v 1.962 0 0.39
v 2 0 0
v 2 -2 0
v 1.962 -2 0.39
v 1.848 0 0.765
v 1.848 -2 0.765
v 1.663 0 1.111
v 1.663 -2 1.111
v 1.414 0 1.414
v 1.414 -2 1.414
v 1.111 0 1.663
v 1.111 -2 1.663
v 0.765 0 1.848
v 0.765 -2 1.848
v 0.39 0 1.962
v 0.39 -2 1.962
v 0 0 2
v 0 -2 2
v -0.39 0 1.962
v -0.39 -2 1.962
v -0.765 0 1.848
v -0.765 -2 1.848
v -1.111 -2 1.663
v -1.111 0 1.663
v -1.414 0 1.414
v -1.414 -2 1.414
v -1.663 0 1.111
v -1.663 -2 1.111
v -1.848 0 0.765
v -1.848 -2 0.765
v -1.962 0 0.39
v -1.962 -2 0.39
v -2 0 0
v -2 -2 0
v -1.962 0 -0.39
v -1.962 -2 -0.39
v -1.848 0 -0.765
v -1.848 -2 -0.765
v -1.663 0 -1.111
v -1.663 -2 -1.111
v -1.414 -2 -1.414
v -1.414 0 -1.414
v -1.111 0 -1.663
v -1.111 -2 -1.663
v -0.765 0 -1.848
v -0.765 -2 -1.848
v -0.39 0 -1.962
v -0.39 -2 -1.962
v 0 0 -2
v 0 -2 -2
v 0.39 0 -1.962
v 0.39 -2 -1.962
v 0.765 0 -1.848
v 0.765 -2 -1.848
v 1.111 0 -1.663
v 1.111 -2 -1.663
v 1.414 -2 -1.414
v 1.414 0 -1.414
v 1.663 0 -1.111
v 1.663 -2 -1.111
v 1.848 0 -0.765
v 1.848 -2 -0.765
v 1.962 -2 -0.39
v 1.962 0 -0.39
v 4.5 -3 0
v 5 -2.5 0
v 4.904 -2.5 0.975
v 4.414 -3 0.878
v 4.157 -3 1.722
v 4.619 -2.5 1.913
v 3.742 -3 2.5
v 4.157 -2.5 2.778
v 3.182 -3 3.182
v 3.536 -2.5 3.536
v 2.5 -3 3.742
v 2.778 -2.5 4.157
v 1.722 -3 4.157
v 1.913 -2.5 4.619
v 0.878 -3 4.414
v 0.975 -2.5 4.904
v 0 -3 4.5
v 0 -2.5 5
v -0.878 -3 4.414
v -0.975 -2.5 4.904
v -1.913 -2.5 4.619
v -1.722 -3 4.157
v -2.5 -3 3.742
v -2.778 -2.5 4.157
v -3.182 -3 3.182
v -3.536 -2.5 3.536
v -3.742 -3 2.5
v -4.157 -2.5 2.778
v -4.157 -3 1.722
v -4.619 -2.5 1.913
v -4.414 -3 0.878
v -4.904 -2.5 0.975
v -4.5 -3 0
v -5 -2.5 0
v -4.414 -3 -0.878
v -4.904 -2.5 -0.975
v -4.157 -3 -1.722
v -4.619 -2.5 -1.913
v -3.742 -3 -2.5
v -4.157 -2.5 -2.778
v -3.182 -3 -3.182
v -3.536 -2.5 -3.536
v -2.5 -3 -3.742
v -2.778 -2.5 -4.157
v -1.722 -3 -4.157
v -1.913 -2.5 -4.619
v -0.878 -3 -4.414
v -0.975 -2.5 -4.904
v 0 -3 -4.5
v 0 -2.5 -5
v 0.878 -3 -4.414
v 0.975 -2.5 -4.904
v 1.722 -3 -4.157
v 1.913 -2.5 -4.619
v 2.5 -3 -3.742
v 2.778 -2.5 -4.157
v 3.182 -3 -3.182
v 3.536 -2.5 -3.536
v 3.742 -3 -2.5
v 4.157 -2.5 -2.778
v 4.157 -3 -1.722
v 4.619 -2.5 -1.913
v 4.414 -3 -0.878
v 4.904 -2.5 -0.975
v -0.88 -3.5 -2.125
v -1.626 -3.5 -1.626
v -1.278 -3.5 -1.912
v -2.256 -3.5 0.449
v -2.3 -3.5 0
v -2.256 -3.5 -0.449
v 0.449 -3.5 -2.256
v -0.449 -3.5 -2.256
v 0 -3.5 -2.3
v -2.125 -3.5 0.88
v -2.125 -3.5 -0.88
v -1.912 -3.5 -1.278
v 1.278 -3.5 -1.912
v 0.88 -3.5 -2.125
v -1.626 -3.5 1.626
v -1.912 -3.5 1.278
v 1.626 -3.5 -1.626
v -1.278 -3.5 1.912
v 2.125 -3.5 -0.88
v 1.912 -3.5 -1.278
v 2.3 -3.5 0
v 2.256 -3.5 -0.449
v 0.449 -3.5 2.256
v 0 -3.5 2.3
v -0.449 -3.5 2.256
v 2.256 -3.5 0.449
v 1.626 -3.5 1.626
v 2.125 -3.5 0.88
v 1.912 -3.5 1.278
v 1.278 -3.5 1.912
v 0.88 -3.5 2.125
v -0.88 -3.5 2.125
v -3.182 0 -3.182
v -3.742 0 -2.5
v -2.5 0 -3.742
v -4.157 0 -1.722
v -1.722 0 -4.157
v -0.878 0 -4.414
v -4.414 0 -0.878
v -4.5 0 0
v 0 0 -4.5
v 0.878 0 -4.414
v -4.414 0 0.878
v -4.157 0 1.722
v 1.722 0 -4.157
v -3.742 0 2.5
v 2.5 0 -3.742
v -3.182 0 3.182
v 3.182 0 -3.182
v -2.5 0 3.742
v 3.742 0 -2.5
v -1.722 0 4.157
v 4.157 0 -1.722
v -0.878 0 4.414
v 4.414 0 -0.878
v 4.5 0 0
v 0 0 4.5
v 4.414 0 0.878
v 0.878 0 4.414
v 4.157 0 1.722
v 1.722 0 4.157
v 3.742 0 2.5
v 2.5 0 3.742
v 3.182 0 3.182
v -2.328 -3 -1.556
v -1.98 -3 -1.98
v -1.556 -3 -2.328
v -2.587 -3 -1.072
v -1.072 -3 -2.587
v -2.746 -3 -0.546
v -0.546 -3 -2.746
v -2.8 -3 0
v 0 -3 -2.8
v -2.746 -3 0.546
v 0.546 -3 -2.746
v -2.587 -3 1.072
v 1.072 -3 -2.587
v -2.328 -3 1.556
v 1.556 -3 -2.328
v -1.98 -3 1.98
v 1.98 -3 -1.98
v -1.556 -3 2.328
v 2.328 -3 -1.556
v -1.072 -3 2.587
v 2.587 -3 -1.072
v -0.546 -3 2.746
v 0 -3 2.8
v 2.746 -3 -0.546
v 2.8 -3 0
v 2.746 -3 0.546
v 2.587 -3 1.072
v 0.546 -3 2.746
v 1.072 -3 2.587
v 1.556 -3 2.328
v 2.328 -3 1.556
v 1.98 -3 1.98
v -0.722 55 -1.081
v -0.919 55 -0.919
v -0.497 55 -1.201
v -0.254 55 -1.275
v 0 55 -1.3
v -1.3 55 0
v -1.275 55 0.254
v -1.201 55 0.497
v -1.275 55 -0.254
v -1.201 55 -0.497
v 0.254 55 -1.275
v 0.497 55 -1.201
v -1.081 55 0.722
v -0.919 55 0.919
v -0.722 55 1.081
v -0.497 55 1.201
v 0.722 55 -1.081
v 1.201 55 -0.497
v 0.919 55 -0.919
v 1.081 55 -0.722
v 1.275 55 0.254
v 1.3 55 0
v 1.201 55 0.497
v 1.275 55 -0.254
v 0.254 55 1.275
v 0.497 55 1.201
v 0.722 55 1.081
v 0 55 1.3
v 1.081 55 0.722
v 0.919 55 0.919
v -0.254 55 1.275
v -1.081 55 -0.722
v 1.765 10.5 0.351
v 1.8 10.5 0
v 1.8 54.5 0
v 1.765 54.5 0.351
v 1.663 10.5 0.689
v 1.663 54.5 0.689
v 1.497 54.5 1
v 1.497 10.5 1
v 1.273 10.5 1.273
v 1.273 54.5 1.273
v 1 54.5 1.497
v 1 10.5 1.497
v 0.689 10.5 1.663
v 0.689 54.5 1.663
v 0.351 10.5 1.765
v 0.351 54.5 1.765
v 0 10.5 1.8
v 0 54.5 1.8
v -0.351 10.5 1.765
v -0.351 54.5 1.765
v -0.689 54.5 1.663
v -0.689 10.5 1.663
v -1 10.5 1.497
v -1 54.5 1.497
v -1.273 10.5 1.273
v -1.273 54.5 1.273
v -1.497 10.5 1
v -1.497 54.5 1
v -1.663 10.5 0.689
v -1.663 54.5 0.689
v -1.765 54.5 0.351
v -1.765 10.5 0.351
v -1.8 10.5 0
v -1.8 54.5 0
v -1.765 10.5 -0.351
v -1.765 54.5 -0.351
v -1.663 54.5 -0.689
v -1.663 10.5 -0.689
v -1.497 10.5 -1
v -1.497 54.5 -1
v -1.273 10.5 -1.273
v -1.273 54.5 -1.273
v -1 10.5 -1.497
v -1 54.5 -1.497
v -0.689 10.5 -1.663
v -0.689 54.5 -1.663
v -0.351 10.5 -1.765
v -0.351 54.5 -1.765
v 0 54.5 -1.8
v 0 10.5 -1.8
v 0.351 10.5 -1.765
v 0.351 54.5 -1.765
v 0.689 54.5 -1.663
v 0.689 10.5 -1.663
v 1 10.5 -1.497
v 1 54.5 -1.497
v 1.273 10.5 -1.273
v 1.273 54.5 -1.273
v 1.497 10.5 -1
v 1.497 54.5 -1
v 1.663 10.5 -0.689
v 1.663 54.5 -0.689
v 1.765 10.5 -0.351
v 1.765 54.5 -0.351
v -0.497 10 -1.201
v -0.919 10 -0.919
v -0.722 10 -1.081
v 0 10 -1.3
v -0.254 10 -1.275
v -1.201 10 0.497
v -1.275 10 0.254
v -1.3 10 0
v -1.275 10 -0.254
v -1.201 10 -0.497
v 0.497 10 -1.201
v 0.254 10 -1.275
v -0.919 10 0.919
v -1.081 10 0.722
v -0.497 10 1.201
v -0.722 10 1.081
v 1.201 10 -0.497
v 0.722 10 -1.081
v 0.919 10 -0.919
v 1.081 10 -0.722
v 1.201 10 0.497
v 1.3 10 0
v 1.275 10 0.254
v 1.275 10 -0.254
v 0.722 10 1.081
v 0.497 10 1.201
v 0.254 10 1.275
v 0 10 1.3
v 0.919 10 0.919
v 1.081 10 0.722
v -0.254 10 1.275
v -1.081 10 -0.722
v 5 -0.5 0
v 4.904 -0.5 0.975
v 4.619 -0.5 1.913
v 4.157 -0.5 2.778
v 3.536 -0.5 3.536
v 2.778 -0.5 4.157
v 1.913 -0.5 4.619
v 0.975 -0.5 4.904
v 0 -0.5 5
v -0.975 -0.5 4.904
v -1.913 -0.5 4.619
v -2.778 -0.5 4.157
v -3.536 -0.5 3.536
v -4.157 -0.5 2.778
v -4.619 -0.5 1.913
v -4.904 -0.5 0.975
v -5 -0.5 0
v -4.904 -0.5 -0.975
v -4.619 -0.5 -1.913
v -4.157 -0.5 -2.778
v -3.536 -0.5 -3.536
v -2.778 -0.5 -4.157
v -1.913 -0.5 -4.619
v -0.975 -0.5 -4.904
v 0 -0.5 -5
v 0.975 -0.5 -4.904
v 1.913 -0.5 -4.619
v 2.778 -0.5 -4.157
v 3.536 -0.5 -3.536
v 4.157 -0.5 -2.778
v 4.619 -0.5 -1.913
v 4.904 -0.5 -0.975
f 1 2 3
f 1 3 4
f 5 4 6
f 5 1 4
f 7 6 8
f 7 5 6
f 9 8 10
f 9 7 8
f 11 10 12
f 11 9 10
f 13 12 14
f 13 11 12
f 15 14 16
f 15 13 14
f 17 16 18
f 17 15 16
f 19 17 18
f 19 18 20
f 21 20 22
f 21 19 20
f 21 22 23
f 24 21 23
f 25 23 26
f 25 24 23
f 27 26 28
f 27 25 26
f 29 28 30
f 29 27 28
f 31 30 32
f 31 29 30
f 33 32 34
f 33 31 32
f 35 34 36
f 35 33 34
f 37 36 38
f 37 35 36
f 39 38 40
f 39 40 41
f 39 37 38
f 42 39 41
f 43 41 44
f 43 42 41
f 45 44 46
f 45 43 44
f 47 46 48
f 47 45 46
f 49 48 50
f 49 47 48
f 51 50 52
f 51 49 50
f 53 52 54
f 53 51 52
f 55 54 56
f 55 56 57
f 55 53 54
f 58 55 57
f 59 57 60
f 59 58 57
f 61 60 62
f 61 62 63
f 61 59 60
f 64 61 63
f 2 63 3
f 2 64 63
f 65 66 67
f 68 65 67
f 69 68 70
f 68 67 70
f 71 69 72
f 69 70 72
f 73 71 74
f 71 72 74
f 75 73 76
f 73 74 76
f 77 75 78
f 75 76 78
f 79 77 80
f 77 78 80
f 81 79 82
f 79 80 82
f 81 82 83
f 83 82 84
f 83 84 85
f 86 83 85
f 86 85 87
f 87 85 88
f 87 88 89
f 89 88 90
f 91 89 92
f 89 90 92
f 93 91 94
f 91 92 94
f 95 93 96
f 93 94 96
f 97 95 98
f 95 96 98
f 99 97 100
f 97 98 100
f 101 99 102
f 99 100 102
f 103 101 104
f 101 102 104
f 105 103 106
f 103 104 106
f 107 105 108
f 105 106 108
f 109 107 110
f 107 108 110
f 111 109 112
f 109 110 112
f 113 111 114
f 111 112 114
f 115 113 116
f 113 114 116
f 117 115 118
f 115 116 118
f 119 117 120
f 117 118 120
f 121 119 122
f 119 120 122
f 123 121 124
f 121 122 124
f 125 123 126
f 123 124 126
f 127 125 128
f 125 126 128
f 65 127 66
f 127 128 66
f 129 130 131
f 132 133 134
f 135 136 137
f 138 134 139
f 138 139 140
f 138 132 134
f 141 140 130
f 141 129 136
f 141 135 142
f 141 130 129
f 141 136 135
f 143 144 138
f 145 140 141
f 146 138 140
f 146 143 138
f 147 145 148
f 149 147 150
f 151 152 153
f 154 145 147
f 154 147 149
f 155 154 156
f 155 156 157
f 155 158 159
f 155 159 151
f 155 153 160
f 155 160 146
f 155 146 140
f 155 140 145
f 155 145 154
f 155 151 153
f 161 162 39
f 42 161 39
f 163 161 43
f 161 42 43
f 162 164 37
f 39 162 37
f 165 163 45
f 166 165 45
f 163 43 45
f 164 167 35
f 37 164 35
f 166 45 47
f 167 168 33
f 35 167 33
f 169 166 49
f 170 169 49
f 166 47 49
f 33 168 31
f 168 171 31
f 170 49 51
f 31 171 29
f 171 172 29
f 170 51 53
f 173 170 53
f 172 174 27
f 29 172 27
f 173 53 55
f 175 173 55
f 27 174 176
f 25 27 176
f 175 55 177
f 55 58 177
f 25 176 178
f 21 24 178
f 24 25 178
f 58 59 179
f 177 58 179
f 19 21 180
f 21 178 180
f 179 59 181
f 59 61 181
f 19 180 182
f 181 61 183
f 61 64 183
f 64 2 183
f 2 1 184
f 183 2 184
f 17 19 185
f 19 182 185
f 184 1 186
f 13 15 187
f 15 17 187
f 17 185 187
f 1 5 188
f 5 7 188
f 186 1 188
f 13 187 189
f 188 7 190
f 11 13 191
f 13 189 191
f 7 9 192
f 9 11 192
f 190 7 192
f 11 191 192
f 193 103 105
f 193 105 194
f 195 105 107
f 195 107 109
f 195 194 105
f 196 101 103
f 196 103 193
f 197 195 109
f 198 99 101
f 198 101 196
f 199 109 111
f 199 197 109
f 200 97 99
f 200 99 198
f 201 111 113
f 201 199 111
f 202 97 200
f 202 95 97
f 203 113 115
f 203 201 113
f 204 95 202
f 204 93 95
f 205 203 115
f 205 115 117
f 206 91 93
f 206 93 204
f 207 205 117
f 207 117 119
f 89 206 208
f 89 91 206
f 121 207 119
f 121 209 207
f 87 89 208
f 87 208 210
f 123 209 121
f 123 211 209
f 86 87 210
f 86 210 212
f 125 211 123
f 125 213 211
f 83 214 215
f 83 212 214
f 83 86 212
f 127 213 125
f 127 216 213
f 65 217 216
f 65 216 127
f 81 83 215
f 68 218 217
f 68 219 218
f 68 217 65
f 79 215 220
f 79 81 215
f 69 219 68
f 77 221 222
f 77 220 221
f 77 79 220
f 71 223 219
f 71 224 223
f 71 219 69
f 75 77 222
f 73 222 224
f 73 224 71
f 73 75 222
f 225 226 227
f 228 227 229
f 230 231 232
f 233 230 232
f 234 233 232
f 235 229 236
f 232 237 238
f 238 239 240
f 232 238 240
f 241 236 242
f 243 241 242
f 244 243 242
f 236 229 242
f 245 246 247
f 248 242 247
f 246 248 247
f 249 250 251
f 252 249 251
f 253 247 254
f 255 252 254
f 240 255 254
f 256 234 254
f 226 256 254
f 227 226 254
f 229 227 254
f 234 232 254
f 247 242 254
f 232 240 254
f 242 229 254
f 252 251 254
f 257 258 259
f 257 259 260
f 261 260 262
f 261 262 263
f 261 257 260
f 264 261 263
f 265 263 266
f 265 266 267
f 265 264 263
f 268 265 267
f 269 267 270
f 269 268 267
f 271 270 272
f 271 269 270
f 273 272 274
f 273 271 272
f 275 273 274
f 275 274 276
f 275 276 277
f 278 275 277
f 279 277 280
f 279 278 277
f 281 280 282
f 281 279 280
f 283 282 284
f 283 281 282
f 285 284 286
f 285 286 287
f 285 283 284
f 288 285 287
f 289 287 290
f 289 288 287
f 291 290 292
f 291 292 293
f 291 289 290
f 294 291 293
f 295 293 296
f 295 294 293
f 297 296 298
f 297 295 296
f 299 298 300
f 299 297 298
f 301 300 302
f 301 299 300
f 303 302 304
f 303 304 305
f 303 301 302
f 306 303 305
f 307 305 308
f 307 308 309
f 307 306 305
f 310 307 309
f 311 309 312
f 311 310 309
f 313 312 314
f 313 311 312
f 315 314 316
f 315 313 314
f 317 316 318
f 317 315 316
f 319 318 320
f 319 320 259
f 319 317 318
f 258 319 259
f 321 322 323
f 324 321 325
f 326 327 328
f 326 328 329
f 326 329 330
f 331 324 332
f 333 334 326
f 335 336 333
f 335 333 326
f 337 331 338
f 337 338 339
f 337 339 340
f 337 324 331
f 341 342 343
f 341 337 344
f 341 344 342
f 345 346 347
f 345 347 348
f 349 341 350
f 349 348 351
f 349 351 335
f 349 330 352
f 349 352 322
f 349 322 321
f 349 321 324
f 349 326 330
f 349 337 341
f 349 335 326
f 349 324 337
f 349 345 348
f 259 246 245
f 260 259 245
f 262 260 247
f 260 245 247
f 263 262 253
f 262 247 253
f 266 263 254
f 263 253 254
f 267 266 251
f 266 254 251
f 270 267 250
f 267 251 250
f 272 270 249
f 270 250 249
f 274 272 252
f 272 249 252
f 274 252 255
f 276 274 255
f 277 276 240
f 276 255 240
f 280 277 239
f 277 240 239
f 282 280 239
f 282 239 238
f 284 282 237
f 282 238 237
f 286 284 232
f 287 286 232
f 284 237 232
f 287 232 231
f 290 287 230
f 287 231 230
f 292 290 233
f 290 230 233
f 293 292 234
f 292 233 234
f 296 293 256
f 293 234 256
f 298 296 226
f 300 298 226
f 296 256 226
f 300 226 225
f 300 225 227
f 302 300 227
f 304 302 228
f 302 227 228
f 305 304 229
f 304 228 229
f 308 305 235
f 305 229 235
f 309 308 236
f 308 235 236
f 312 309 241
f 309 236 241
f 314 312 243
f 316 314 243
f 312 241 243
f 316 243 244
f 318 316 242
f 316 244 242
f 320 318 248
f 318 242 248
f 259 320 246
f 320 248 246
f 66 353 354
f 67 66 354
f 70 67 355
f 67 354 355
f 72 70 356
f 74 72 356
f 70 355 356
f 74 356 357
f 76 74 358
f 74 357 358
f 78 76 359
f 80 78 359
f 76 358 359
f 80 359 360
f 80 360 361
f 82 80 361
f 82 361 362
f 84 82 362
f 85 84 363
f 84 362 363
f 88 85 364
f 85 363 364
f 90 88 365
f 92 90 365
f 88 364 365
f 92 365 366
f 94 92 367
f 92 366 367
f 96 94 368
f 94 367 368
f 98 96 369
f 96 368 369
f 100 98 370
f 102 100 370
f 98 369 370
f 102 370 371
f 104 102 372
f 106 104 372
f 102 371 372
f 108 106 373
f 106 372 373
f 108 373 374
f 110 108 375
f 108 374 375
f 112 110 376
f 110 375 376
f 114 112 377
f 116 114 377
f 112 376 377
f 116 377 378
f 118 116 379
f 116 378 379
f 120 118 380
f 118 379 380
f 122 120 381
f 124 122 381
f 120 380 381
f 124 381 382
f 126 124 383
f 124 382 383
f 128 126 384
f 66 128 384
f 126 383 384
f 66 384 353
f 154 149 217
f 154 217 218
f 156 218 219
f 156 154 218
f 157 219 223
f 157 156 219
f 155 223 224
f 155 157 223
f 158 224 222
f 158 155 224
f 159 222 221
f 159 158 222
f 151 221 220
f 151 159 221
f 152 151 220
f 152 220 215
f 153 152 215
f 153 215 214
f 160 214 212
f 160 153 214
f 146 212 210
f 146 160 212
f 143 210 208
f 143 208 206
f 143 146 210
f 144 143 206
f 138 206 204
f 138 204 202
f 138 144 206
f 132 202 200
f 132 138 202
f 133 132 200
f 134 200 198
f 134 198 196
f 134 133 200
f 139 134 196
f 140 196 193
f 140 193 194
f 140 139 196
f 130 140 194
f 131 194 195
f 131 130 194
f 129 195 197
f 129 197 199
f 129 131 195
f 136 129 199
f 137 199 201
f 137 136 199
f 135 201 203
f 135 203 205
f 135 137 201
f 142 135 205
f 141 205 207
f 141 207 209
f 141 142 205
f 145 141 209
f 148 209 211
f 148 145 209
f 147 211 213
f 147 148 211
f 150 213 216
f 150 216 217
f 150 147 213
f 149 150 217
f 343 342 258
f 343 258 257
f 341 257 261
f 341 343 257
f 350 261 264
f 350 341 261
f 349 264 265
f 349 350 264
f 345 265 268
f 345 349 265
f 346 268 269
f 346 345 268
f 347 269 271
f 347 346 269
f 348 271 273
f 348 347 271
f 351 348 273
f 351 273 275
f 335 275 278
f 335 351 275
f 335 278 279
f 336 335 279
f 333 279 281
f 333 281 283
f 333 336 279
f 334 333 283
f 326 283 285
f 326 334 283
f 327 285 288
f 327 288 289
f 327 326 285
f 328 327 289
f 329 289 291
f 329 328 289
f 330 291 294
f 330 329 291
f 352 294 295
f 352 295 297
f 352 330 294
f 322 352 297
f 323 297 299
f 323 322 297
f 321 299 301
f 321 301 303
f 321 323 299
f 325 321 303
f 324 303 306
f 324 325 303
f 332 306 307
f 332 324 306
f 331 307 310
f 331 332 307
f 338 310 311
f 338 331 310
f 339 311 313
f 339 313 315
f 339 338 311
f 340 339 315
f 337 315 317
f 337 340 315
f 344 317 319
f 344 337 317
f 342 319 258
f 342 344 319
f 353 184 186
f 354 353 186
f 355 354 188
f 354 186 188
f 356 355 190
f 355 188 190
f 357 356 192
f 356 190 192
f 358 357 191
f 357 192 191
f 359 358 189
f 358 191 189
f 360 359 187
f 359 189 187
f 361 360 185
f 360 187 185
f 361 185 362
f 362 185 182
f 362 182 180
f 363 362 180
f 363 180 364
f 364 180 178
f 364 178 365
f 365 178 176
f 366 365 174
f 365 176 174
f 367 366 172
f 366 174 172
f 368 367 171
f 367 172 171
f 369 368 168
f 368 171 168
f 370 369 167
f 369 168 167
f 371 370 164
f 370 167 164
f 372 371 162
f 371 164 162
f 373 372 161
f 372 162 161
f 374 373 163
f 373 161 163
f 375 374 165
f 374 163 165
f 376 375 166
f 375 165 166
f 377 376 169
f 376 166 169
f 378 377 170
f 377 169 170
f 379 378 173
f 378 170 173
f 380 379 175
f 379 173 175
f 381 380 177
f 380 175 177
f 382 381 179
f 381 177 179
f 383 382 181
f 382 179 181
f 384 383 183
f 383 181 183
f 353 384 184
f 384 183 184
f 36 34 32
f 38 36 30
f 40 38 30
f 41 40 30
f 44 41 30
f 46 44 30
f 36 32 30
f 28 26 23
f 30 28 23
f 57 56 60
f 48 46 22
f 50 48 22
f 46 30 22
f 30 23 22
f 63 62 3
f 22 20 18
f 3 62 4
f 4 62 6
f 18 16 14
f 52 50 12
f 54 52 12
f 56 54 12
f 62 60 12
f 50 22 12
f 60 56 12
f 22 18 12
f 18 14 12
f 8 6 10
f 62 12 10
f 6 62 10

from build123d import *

# Parameters (mm, degrees)
F0_R     = 5
F0_R_2   = 2.8
F1_DEPTH = 3
F0_R_3   = 2
F0_R_4   = 1.8
F2_DEPTH = 3.5
F3_DEPTH = 2
F4_SIZE  = 0.49999
F5_START = -10
F5_DEPTH = 45
F6_SIZE  = 0.5


# Not quite as in the source:
# - a fillet or chamfer is up to 0.001 mm smaller than in the source, because OpenCascade refuses the exact size


with BuildPart() as f1:
    # F0 (on Front) → F1 (new body)
    with BuildSketch(Plane.XZ):
        Circle(F0_R)
        Circle(F0_R_2, mode=Mode.SUBTRACT)
    extrude(amount=F1_DEPTH)

    # F0 (on Front) → F2 (join)
    with BuildSketch(Plane.XZ):
        Circle(F0_R_2)
        Circle(F0_R_3, mode=Mode.SUBTRACT)
        Circle(F0_R_3)
        Circle(F0_R_4, mode=Mode.SUBTRACT)
        Circle(F0_R_4)
    extrude(amount=F2_DEPTH)

    # F0 (on Front) → F3 (cut)
    with BuildSketch(Plane.XZ):
        Circle(F0_R_3)
        Circle(F0_R_4, mode=Mode.SUBTRACT)
        Circle(F0_R_4)
    extrude(amount=F3_DEPTH, mode=Mode.SUBTRACT)

    # F4 (size 0.5 in the source; OpenCascade refuses exactly that, so slightly less here)
    f4_edges = [f1.edges().sort_by_distance(p)[0] for p in [
        (-2.8, -3.5, 0),
        (-5, -3, 0),
        (-5, 0, 0),
    ]]
    chamfer(f4_edges, length=F4_SIZE)


with BuildPart() as f5:
    # F0 (on Front) → F5 (new body)
    with BuildSketch(Plane.XZ.offset(F5_START)):
        Circle(F0_R_4)
    extrude(amount=-F5_DEPTH)

    # F6
    f6_edges = [f5.edges().sort_by_distance(p)[0] for p in [
        (-1.8, 55, 0),
        (-1.8, 10, 0),
    ]]
    chamfer(f6_edges, length=F6_SIZE)


solid = Compound([f1.part, f5.part])
